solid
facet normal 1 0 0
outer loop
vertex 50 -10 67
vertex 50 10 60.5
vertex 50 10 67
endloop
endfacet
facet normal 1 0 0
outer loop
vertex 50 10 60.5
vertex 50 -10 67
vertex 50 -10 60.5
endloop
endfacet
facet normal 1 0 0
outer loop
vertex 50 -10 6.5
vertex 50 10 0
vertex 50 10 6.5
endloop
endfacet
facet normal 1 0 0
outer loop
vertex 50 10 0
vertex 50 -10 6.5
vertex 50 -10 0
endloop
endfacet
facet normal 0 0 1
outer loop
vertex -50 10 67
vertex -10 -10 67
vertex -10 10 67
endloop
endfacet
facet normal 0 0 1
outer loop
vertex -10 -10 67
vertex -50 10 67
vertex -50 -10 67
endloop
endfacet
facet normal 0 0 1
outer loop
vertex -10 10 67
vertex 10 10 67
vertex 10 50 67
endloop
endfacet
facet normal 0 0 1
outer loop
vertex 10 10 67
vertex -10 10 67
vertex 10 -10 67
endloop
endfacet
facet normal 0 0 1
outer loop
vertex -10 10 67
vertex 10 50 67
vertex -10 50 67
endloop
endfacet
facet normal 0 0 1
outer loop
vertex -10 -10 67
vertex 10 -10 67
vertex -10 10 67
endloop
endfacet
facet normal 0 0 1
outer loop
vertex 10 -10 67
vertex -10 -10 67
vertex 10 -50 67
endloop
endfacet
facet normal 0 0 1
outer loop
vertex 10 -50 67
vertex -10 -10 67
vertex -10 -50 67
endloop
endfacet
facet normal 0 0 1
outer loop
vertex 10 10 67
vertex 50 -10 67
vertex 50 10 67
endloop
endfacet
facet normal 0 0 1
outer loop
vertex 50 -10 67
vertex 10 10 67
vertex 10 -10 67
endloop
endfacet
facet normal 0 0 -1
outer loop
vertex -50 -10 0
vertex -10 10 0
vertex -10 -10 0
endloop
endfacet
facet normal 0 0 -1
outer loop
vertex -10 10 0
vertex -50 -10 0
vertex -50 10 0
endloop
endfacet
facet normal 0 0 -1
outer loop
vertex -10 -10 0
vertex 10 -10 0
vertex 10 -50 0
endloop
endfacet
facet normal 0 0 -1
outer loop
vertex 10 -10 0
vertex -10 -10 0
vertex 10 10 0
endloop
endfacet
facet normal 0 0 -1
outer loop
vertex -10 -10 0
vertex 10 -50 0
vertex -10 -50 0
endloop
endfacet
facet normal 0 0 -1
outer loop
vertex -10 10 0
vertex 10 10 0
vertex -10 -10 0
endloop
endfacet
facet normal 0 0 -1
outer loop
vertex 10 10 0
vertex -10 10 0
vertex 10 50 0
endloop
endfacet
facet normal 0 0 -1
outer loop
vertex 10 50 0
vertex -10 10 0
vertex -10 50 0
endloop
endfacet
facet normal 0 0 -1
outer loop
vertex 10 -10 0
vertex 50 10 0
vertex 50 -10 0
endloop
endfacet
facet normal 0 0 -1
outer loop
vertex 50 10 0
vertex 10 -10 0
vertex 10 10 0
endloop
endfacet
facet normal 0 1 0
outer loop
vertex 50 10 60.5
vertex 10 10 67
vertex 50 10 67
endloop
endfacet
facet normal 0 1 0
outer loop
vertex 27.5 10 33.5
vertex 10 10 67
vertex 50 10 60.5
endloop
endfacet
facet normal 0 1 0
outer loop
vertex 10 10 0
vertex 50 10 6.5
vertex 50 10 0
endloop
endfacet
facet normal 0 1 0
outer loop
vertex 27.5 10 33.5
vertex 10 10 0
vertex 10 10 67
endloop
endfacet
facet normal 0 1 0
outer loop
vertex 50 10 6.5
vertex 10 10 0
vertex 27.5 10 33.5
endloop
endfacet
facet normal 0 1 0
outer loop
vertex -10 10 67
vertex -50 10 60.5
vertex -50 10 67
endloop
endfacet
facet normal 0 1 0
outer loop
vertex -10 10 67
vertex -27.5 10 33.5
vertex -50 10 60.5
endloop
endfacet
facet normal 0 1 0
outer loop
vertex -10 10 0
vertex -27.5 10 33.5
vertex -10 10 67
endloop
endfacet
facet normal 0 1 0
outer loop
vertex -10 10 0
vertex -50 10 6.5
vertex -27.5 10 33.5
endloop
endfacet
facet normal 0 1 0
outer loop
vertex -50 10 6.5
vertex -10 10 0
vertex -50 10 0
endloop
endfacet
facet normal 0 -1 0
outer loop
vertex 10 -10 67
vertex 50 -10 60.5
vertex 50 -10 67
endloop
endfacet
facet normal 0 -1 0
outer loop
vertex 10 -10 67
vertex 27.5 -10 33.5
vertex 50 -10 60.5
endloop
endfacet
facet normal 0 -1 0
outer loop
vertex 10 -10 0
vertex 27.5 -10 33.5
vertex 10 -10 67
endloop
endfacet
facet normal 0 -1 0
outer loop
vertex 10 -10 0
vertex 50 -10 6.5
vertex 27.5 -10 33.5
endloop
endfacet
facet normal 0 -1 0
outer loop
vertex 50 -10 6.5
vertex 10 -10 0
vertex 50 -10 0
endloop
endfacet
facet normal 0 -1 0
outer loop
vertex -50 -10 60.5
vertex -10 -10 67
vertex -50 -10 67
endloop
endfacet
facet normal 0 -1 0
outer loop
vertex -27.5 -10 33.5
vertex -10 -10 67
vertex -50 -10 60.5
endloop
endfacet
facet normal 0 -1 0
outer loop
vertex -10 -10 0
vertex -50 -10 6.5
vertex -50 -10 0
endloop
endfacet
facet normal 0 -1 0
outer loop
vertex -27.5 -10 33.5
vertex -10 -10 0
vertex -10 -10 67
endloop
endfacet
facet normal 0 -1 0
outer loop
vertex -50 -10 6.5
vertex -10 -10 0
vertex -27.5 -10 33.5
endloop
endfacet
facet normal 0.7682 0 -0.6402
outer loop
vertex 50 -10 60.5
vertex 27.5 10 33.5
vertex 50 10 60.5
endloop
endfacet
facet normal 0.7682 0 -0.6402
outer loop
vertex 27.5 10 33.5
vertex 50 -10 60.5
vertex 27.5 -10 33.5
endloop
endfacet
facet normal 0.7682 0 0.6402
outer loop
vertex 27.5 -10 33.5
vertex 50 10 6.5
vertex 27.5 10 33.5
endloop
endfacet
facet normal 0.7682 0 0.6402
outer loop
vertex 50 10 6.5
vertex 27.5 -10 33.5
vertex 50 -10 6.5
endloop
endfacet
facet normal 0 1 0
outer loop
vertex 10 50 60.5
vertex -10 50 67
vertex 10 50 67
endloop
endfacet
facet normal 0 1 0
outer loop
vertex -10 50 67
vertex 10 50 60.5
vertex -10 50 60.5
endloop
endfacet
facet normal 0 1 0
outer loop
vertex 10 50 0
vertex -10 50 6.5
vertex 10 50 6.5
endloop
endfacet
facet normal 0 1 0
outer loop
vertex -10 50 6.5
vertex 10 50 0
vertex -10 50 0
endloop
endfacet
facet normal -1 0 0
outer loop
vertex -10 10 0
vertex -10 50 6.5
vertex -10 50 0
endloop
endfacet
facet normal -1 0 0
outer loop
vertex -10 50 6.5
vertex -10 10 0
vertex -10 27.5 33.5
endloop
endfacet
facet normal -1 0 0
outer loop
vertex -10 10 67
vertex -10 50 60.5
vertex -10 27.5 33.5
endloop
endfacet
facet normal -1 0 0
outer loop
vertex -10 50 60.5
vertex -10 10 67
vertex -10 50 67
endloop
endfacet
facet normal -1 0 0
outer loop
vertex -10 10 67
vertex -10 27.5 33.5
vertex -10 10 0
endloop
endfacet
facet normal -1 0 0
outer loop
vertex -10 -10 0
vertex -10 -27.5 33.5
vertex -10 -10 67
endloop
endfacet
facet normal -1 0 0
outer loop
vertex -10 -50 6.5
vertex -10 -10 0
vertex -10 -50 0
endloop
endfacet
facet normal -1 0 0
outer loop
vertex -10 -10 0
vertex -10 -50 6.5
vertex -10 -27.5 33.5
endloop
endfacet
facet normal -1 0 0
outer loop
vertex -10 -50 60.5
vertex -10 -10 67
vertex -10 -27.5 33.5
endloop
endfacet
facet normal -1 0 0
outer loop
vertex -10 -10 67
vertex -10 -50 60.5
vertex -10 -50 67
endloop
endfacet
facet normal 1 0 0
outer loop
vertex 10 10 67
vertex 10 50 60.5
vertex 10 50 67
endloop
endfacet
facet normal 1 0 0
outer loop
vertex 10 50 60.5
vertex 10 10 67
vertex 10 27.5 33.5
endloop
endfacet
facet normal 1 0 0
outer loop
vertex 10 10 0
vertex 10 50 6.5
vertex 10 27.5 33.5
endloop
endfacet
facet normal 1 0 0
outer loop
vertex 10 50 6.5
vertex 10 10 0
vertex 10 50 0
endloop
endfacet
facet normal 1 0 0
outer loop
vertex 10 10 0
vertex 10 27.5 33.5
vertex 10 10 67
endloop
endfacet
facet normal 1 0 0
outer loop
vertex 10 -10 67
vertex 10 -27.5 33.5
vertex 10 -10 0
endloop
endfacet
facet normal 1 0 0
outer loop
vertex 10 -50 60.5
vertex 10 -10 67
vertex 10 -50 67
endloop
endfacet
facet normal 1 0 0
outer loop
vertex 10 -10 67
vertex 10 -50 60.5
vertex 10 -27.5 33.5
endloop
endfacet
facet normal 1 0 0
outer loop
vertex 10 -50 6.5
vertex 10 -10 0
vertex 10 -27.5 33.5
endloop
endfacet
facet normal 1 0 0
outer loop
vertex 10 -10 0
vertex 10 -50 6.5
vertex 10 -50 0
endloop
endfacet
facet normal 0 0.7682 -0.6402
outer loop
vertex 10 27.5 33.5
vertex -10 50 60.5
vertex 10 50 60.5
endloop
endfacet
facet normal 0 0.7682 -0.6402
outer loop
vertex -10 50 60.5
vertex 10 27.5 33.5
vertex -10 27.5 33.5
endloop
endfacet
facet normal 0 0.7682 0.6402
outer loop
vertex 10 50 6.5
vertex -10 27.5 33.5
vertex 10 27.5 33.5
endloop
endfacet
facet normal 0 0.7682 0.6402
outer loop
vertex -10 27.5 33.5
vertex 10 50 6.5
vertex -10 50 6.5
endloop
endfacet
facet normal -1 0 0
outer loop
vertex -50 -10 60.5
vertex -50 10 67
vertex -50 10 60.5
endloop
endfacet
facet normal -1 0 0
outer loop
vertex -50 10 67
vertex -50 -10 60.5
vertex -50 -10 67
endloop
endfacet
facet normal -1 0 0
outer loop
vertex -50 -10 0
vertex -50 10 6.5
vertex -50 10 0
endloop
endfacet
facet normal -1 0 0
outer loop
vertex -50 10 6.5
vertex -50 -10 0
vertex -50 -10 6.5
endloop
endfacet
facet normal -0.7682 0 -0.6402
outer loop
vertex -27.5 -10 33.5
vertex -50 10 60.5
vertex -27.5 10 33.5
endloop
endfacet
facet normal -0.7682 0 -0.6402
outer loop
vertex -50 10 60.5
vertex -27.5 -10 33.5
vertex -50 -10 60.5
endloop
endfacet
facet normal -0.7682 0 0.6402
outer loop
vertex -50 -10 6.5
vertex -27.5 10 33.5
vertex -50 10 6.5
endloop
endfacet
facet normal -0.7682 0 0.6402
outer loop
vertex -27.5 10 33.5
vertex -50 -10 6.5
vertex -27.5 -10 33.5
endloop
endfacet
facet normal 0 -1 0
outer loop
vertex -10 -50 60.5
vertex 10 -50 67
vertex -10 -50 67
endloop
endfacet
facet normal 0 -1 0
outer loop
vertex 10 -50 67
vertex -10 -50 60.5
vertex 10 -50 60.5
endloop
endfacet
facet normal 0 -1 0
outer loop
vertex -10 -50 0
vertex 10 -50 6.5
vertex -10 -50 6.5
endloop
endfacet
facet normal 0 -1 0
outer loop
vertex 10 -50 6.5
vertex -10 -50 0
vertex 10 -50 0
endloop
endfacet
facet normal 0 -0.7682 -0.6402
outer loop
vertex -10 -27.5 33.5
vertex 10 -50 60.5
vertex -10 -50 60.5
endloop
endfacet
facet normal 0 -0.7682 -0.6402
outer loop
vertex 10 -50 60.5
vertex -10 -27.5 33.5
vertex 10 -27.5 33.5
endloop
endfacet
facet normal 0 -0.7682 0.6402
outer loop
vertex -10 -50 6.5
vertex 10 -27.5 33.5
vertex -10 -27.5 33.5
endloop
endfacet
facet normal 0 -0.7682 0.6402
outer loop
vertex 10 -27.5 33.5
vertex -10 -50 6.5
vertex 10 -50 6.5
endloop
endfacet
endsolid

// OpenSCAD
for (i=[0:3]) {
   rotate([0,0,90*i]) side();
}

module side() {
   difference() {
      translate([0,-10,0]) cube([50,20,67]);
      translate([50,15,33.5]) scale([1,1,1.2]) rotate([90,0,0]) cylinder($fn=4,d=45,h=30);
   }
}
